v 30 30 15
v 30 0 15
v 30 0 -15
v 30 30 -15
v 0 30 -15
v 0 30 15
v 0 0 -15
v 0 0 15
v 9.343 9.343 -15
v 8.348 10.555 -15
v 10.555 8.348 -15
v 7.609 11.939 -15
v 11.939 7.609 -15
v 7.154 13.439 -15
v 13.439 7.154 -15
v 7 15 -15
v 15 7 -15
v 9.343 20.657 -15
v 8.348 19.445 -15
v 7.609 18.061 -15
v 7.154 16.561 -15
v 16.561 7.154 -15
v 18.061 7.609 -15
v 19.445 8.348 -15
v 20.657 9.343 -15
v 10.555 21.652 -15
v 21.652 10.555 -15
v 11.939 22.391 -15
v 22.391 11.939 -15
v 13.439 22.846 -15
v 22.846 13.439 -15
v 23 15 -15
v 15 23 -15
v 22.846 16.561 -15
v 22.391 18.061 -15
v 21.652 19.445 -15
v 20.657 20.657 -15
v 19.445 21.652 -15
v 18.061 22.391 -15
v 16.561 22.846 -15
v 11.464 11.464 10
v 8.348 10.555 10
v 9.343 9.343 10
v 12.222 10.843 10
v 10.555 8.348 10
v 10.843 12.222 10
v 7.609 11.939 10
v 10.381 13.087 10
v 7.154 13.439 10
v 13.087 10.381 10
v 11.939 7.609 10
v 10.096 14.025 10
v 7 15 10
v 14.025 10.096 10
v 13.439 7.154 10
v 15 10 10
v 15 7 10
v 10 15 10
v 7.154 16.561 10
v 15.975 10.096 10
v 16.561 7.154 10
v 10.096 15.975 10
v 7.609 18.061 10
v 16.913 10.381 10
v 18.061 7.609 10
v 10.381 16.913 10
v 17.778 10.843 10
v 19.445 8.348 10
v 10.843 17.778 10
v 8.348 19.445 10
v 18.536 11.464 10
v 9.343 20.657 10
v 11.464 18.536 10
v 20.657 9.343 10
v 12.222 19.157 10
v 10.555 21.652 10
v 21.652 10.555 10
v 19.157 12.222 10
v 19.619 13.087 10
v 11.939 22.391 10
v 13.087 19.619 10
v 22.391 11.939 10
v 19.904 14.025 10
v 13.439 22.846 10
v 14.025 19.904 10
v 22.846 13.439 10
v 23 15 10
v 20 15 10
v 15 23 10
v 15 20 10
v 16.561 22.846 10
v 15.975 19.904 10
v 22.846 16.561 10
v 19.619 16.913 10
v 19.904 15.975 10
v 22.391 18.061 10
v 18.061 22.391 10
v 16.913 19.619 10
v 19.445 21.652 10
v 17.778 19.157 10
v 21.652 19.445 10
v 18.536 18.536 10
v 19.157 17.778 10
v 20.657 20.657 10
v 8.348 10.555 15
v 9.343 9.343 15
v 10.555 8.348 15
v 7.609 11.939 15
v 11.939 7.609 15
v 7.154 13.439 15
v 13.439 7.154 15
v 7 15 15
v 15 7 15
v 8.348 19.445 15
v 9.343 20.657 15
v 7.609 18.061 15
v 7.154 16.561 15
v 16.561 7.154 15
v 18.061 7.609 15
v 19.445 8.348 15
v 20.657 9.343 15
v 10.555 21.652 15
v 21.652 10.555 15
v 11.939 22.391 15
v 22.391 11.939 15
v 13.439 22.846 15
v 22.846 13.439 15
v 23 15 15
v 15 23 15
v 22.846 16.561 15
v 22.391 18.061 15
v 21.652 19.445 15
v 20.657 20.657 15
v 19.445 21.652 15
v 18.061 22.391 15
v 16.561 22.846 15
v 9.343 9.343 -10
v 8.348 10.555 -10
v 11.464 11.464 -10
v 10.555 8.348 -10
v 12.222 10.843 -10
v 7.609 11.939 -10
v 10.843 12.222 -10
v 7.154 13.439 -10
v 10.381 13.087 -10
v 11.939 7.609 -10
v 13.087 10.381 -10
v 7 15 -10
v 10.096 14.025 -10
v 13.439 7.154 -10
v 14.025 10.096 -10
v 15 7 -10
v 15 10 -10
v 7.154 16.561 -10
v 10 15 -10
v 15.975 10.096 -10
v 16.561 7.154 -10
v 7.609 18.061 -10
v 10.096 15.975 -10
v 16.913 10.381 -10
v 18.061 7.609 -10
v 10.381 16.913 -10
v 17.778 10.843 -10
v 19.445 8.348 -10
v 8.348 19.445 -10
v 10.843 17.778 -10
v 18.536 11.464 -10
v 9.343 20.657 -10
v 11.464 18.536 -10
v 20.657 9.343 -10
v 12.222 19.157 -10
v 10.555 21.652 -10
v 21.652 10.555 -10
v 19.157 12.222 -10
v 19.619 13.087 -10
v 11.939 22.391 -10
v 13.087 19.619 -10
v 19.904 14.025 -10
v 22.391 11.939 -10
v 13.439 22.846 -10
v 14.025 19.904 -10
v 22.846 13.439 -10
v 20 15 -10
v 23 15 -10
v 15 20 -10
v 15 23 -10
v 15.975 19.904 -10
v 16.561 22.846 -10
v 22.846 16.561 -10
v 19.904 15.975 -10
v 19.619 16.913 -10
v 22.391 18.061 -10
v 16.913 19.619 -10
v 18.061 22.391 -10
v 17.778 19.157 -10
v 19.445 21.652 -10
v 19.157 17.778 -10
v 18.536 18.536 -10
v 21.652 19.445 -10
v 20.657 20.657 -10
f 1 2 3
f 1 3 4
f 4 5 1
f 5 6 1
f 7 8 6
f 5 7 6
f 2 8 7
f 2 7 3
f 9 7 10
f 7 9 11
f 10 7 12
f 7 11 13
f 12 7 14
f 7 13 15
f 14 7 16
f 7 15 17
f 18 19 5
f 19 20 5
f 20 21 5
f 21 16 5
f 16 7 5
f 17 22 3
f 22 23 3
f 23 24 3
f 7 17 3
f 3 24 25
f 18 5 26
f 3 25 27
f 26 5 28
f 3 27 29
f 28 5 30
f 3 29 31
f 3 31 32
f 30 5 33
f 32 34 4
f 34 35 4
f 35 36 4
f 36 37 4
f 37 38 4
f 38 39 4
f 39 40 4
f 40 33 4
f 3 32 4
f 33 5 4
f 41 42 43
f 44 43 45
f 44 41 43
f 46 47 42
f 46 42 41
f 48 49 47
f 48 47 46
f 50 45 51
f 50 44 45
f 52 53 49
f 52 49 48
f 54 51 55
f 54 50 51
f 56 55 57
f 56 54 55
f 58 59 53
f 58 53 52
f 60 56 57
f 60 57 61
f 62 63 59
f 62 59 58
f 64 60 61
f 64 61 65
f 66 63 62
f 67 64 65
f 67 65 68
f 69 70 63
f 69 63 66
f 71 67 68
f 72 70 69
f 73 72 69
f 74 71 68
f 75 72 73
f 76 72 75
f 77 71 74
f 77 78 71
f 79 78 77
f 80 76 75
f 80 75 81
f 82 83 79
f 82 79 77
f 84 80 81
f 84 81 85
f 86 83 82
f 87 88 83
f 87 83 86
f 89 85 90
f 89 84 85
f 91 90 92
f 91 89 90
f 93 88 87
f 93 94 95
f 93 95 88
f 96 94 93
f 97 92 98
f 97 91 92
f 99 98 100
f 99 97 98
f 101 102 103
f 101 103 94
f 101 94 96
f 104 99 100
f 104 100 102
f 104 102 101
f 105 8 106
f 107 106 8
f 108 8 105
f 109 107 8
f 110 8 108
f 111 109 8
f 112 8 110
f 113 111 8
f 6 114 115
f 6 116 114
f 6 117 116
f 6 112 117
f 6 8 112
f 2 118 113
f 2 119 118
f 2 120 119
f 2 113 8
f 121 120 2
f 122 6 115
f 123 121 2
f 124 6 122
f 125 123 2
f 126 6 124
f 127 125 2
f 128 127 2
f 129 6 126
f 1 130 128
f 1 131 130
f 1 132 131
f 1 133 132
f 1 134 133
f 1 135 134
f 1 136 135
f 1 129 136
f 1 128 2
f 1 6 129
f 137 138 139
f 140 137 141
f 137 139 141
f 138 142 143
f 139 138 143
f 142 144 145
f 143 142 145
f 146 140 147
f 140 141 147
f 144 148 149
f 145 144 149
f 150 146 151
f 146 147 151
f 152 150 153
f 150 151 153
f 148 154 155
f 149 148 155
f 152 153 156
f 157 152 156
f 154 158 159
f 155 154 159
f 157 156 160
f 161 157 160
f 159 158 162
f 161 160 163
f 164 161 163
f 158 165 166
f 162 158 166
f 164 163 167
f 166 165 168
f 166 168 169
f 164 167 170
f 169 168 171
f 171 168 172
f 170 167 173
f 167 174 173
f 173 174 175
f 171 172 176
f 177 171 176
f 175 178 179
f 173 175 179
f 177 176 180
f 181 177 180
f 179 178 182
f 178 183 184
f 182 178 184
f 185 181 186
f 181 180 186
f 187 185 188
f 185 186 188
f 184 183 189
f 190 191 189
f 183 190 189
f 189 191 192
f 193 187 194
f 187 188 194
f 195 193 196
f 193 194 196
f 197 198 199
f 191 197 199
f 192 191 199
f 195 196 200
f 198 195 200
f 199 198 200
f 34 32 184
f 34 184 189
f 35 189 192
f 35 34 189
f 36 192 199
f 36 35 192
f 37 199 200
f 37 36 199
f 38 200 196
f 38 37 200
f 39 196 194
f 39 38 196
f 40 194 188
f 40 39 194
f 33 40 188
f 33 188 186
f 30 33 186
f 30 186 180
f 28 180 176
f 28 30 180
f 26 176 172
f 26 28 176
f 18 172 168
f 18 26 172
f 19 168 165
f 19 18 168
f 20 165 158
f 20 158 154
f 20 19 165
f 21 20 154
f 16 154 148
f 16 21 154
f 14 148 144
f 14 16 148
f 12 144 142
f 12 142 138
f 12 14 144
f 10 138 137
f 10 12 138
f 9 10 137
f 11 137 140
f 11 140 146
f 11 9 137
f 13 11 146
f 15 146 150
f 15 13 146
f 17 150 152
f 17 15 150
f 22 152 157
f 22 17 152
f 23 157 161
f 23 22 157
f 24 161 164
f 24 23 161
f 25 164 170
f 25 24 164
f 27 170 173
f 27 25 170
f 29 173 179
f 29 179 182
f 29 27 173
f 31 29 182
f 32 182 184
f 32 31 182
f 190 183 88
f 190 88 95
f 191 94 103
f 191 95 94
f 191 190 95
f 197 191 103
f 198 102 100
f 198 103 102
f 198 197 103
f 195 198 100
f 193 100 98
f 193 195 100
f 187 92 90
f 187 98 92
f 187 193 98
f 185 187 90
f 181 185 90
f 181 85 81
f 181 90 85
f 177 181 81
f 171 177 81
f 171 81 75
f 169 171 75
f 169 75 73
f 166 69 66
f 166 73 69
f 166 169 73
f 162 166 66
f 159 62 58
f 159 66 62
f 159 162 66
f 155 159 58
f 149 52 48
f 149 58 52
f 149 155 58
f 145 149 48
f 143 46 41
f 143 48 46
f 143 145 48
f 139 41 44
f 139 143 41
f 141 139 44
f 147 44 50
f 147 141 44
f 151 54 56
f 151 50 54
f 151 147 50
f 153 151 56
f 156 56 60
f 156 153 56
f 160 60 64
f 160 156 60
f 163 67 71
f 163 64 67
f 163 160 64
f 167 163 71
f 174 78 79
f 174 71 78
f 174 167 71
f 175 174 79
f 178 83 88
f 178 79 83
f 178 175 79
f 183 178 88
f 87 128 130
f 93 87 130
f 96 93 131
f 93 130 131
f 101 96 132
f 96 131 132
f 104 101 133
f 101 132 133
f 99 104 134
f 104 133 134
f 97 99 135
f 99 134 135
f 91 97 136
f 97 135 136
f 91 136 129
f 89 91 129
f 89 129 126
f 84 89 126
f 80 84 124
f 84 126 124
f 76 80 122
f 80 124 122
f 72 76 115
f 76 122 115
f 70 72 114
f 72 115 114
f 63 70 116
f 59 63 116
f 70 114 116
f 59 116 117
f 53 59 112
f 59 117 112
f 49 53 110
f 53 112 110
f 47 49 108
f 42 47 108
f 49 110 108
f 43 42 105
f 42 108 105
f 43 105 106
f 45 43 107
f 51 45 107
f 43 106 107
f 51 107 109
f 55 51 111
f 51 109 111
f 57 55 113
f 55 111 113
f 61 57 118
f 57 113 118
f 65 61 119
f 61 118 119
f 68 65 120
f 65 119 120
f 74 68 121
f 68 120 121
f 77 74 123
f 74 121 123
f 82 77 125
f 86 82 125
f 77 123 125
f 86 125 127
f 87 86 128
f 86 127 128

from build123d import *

# Parameters (mm, degrees)
SKETCH_1_W          = 30
SKETCH_1_H          = 30
SKETCH_1_R          = 5
EXTRUDE_1_DEPTH     = 15
SKETCH_3_R          = 8
CUT_EXTRUDE_1_DEPTH = 5


with BuildPart() as part:
    # 草圖1 → 填料-伸長1 (new, symmetric)
    with BuildSketch(Plane.XY):
        with Locations((15, 15)):
            Rectangle(SKETCH_1_W, SKETCH_1_H)
        with Locations((15, 15)):
            Circle(SKETCH_1_R, mode=Mode.SUBTRACT)
    extrude(amount=EXTRUDE_1_DEPTH, both=True)

    # 草圖3 → 除料-伸長1 (cut)
    with BuildSketch(Plane.XY.offset(15)):
        with Locations((15, 15)):
            Circle(SKETCH_3_R)
    cut_extrude_1 = extrude(amount=-CUT_EXTRUDE_1_DEPTH, mode=Mode.SUBTRACT)

    # 鏡射1: 除料-伸長1 across plane
    add(cut_extrude_1.mirror(Plane.XY), mode=Mode.SUBTRACT)


solid = part.part
